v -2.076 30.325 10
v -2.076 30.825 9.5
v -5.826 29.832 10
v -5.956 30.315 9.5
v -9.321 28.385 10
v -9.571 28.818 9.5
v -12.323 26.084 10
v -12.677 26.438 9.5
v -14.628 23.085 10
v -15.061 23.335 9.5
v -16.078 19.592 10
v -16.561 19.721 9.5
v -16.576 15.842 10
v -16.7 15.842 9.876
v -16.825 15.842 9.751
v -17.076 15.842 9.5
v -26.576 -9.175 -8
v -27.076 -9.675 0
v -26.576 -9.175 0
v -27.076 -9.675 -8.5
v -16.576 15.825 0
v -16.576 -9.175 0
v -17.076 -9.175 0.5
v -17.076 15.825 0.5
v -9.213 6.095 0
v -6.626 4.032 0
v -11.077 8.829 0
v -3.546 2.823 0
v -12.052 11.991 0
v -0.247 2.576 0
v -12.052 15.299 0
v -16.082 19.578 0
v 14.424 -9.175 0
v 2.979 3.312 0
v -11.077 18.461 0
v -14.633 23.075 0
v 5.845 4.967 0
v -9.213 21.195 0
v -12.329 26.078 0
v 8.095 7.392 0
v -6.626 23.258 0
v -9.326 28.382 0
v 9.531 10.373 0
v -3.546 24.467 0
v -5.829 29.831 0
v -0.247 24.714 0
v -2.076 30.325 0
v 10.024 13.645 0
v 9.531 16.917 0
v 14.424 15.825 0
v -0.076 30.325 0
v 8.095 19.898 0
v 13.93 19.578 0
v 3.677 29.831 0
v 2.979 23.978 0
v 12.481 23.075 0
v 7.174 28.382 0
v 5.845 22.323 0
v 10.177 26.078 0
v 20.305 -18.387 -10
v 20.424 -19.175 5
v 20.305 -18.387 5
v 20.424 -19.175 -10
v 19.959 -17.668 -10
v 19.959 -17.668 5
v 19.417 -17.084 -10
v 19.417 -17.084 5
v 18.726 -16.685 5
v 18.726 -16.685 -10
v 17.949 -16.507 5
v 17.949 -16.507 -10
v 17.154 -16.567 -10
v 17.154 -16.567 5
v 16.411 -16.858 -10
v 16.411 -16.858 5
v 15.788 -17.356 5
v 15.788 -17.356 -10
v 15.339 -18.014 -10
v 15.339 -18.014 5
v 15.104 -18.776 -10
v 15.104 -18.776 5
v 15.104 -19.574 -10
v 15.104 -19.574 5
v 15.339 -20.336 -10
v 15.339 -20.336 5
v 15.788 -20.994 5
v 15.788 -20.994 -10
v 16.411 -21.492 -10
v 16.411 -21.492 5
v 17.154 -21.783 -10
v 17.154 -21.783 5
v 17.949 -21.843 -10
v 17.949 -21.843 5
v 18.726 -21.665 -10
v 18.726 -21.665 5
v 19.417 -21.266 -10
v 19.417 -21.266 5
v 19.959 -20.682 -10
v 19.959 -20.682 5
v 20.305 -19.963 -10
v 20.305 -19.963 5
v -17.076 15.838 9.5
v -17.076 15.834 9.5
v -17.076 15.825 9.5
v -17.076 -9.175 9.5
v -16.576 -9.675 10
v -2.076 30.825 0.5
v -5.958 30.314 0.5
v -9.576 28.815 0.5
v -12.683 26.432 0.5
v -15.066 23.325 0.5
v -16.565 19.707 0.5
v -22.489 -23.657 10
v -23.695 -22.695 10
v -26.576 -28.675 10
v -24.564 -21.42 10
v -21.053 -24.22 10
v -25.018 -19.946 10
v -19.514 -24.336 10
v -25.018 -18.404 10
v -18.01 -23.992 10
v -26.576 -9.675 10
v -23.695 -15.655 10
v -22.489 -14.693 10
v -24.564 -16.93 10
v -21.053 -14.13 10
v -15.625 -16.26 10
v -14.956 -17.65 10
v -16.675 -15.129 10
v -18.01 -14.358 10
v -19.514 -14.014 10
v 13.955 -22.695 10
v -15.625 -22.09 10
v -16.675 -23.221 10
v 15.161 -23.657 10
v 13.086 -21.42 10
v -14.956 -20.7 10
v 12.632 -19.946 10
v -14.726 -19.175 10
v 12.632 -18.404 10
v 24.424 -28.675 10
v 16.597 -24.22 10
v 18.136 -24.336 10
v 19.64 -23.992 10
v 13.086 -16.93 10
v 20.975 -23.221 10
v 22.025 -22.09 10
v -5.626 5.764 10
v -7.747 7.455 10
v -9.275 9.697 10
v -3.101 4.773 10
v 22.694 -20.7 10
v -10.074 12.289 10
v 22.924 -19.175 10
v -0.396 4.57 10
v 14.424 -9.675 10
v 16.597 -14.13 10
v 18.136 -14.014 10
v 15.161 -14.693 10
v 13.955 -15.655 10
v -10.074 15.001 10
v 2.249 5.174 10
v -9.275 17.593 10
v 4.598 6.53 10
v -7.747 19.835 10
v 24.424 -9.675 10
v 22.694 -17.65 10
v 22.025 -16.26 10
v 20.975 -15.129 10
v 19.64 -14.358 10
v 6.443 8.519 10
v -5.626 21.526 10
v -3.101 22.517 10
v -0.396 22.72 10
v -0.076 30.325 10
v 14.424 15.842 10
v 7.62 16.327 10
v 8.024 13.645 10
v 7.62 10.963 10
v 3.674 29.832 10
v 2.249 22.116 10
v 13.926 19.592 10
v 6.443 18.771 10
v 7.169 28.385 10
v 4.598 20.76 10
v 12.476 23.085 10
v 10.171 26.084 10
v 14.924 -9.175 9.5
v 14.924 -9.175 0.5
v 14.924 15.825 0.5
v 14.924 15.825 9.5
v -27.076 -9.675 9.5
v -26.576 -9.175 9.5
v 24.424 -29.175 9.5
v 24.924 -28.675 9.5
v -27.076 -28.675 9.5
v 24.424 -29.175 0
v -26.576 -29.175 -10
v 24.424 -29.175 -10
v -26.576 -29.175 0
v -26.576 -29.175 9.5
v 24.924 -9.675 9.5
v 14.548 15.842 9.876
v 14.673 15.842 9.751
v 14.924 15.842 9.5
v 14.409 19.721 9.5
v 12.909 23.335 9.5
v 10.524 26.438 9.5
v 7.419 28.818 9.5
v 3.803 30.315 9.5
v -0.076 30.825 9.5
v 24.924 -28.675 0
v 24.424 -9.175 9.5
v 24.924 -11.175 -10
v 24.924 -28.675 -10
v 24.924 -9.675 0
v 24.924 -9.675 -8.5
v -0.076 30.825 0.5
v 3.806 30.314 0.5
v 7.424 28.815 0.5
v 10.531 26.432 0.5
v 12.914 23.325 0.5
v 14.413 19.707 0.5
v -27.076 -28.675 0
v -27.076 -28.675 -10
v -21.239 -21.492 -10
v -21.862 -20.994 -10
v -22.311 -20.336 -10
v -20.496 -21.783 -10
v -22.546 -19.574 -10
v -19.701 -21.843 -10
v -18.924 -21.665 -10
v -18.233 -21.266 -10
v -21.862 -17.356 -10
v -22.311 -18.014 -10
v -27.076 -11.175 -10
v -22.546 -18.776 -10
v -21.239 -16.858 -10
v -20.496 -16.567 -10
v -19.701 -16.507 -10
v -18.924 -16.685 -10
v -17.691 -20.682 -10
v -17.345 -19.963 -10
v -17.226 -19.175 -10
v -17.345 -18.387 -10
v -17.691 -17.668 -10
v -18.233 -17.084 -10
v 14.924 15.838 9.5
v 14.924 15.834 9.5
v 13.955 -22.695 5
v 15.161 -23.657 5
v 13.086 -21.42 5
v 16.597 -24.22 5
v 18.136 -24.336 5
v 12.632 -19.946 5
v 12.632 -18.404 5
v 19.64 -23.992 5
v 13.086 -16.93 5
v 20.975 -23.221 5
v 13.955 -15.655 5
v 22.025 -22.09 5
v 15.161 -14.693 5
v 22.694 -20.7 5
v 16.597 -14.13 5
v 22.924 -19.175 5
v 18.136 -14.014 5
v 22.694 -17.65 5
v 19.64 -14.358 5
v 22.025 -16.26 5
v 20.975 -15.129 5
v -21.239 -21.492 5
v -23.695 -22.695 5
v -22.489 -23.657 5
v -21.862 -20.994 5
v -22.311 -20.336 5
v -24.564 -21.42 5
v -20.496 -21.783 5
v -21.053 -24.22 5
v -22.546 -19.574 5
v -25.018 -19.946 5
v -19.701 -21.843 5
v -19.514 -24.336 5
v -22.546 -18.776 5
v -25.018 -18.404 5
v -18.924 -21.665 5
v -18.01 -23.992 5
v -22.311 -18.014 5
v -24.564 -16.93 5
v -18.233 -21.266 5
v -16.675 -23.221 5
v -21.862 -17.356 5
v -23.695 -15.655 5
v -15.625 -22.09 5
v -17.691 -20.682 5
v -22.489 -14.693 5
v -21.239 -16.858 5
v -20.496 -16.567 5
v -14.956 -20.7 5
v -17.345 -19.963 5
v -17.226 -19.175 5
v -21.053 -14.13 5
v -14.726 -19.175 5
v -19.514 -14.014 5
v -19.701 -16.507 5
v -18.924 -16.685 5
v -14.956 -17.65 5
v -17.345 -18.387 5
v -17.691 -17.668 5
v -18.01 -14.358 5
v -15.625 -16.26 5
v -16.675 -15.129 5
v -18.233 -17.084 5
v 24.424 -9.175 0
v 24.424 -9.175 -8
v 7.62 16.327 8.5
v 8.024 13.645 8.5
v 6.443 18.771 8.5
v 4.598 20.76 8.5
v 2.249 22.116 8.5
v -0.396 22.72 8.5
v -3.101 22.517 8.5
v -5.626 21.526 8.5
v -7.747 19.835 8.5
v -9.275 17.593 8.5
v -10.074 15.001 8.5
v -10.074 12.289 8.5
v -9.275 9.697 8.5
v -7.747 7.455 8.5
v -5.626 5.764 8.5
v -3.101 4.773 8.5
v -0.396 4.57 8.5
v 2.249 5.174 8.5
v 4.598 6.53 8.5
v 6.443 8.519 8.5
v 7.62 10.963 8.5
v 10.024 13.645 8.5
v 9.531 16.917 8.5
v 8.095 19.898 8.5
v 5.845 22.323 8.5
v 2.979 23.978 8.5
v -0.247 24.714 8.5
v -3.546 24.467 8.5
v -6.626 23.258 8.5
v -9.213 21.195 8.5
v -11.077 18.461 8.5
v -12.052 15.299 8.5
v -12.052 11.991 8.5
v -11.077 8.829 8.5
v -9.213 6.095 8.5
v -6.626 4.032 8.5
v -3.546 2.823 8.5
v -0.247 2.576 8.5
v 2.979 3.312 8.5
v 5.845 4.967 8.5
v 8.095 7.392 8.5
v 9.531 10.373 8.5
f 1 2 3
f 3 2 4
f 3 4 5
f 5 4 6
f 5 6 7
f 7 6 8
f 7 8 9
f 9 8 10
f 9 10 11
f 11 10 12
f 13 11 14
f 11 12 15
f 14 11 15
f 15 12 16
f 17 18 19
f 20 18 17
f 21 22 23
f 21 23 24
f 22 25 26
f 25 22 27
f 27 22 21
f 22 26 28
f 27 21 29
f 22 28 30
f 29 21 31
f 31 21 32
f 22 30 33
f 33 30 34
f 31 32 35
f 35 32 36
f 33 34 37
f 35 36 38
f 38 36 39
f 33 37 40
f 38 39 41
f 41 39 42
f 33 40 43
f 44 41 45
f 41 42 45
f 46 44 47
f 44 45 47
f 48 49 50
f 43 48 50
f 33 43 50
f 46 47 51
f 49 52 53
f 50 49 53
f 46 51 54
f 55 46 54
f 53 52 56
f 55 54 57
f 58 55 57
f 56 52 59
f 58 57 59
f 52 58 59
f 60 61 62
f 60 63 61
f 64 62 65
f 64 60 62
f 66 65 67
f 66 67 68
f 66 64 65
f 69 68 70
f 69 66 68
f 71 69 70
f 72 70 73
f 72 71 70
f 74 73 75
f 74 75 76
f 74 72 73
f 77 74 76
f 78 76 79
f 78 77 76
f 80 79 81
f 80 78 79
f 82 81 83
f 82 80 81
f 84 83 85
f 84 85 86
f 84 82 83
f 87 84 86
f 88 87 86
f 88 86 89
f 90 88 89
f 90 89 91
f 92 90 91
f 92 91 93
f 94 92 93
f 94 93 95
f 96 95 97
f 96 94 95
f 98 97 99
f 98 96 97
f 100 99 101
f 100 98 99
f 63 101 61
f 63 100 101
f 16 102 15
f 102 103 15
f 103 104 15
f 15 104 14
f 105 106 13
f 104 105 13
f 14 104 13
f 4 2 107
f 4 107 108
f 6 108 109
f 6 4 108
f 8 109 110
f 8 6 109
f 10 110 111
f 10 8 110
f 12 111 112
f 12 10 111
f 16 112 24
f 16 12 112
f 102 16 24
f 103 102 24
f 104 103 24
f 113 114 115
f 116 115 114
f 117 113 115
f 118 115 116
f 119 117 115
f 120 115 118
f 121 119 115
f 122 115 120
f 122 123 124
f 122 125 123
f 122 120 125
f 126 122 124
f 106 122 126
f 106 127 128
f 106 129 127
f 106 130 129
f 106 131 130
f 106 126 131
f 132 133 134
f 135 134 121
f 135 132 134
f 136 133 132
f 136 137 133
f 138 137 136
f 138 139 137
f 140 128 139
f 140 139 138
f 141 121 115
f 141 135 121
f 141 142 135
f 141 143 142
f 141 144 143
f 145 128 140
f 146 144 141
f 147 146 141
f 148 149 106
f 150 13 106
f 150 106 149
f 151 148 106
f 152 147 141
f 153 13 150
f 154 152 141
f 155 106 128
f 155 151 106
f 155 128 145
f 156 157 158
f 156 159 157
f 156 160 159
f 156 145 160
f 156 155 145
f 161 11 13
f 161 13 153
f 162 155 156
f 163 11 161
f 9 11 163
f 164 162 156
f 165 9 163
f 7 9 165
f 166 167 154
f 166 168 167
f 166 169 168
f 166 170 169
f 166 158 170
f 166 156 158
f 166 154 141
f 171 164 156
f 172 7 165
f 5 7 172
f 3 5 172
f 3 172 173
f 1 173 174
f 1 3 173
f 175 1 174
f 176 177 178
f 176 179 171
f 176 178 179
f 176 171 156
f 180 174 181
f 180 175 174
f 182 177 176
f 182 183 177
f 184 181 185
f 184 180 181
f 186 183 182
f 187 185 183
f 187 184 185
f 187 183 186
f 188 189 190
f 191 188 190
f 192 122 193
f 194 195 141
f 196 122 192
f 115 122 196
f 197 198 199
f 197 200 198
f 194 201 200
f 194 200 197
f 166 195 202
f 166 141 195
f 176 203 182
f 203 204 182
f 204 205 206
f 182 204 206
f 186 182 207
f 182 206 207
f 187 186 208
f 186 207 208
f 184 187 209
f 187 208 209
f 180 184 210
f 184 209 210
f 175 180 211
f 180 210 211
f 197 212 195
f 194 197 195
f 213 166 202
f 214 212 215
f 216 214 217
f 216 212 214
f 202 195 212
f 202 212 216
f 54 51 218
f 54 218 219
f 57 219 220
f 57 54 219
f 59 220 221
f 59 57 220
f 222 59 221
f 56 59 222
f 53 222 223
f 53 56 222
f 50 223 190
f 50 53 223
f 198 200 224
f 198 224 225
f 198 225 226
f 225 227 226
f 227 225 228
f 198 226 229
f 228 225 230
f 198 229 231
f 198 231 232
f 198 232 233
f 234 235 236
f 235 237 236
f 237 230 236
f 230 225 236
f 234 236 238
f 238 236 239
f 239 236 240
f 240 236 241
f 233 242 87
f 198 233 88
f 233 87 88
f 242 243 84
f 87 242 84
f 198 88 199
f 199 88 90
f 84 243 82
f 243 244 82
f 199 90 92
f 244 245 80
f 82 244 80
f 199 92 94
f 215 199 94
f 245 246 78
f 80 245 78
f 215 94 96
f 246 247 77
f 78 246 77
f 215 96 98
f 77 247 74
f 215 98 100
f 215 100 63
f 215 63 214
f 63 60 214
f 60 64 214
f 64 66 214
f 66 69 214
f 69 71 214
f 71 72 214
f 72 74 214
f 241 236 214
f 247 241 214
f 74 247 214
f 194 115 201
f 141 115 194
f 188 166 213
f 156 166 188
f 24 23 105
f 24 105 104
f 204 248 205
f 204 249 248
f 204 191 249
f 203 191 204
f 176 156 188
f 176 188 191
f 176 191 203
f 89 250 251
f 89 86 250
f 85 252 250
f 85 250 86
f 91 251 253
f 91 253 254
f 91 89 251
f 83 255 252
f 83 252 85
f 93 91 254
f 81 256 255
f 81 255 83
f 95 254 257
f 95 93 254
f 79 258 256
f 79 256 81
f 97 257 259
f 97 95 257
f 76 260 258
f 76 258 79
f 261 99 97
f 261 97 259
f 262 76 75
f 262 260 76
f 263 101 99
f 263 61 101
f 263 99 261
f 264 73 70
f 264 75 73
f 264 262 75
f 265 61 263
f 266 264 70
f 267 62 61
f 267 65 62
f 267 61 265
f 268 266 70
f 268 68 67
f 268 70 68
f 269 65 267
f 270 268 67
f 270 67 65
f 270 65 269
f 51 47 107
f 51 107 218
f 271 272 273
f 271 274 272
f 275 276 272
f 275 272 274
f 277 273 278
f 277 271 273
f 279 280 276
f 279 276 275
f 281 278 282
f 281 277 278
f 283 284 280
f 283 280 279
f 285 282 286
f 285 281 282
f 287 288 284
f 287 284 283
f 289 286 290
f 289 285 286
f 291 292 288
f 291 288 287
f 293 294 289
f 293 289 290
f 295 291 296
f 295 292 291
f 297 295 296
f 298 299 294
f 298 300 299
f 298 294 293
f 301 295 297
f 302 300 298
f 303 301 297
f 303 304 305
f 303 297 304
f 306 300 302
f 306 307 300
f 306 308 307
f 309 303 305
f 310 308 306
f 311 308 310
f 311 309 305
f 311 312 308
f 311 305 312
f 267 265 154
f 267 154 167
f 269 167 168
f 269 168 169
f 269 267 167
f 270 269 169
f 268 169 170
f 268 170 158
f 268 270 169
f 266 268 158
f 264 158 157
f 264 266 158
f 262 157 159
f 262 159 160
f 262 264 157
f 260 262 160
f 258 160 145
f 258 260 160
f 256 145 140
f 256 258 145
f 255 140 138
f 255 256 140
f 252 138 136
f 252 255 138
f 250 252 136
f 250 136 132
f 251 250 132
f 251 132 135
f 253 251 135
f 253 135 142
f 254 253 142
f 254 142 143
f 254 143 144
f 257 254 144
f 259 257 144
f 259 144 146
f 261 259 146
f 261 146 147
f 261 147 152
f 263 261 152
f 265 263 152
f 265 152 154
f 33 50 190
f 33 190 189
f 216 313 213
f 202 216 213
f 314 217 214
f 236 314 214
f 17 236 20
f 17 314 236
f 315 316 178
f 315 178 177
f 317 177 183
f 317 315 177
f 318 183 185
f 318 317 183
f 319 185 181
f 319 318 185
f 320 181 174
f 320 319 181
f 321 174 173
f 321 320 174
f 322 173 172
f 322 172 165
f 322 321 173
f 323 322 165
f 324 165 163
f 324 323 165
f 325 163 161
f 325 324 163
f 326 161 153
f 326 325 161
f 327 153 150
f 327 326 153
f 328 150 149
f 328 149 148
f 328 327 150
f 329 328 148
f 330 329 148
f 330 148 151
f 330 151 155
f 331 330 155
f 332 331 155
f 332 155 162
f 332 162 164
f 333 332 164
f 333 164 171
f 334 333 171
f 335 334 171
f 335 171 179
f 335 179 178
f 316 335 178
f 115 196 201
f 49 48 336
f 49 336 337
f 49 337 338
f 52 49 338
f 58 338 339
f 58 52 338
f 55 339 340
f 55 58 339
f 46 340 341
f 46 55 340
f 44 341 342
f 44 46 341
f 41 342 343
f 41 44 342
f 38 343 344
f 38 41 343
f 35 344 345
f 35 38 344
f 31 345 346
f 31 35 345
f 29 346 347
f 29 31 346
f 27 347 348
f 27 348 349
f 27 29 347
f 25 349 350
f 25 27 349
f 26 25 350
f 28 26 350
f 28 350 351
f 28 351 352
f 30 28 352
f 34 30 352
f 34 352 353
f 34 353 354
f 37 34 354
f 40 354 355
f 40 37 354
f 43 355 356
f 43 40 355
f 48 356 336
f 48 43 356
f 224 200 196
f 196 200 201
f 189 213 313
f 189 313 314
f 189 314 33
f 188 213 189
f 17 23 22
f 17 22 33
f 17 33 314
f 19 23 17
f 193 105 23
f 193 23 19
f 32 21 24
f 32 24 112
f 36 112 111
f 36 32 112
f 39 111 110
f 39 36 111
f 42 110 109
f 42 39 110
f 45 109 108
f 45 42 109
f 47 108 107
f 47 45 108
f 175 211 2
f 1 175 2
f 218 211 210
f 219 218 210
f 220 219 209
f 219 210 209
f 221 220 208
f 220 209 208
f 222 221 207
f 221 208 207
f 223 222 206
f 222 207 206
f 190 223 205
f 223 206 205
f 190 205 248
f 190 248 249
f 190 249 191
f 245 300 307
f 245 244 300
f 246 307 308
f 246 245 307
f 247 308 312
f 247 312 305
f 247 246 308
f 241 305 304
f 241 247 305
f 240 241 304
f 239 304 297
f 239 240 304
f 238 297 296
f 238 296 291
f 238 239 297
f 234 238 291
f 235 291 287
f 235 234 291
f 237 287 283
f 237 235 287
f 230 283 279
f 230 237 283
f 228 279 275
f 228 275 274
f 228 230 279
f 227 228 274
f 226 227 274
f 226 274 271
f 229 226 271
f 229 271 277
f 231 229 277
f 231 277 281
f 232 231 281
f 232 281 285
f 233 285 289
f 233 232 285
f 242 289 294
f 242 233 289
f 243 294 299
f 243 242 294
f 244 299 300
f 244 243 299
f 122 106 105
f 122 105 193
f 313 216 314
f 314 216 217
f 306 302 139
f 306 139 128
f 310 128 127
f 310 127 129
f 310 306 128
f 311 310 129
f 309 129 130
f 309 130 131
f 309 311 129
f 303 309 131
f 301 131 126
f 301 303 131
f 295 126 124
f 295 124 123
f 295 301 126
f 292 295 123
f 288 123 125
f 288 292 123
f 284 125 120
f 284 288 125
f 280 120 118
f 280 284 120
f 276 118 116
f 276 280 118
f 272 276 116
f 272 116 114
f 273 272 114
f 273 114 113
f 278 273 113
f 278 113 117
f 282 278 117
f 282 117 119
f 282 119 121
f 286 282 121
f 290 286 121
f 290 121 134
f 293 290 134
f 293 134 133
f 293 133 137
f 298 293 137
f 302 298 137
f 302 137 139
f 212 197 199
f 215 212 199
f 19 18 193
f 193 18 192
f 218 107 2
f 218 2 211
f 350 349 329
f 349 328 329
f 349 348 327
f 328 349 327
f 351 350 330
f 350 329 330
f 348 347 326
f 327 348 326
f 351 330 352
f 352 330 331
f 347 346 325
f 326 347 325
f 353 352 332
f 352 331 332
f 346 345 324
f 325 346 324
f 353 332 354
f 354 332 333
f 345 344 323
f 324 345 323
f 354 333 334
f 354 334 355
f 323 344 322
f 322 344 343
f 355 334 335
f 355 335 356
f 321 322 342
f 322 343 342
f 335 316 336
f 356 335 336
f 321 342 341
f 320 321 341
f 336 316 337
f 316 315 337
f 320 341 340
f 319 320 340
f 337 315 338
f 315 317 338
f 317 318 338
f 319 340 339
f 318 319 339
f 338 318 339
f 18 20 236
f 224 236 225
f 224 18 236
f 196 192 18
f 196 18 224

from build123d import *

# Parameters (mm, degrees)
F0_W      = 32
F0_H      = 40
F0_R      = 11.1
F0_R_2    = 5.175
F1_DEPTH  = 10
F0_R_3    = 2.675
F2_DEPTH  = 5
F3_DEPTH  = 5
F4_SIZE   = 0.5
F5_DEPTH  = 10
F6_DEPTH  = 10
F8_SIZE   = 2
F0_R_4    = 9.1
F9_DEPTH  = 10
F10_DEPTH = 8.5
F11_R     = 15
F12_SIZE  = 0.49999


# Not quite as in the source:
# - a fillet or chamfer is up to 0.001 mm smaller than in the source, because OpenCascade refuses the exact size
# - a feature of the source that left no trace in its solid (it failed there, or was rolled back) is left out


with BuildPart() as f1:
    # F0 (on Top) → F1 (new body)
    with BuildSketch(Plane.XY):
        with Locations((-1.076085493, 10.825)):
            Rectangle(F0_W, F0_H)
        with Locations((-1.076085493, 13.645)):
            Circle(F0_R, mode=Mode.SUBTRACT)
        Polygon((14.923914507, -9.175), (-17.076085493, -9.175), (-27.076085493, -9.175), (-27.076085493, -29.175), (-17.076085493, -29.175), (14.923914507, -29.175), (24.923914507, -29.175), (24.923914507, -9.175), align=None)
        with Locations((-19.901085493, -19.175)):
            Circle(F0_R_2, mode=Mode.SUBTRACT)
        with Locations((17.748914507, -19.175)):
            Circle(F0_R_2, mode=Mode.SUBTRACT)
    extrude(amount=F1_DEPTH)

    # F0 (on Top) → F2 (join)
    with BuildSketch(Plane.XY):
        with Locations((-19.901085493, -19.175)):
            Circle(F0_R_2)
        with Locations((-19.901085493, -19.175)):
            Circle(F0_R_3, mode=Mode.SUBTRACT)
    extrude(amount=F2_DEPTH)

    # F0 (on Top) → F3 (join)
    with BuildSketch(Plane.XY):
        with Locations((17.748914507, -19.175)):
            Circle(F0_R_2)
        with Locations((17.748914507, -19.175)):
            Circle(F0_R_3, mode=Mode.SUBTRACT)
    extrude(amount=F3_DEPTH)

    # F4
    f4_edges = [f1.edges().sort_by_distance(p)[0] for p in [
        (-27.076085, -19.175, 10),
        (-22.076085, -9.175, 10),
        (19.923915, -9.175, 10),
        (24.923915, -19.175, 10),
        (24.923915, -9.175, 5),
        (-27.076085, -9.175, 5),
        (-27.076085, -29.175, 5),
        (24.923915, -29.175, 5),
        (-1.076085, -29.175, 10),
        (-17.076085, 10.825, 10),
        (14.923915, 10.825, 10),
    ]]
    chamfer(f4_edges, length=F4_SIZE)

    # F0 (on Top) → F5 (join)
    with BuildSketch(Plane.XY):
        Polygon((14.923914507, -9.175), (-17.076085493, -9.175), (-27.076085493, -9.175), (-27.076085493, -29.175), (-17.076085493, -29.175), (14.923914507, -29.175), (24.923914507, -29.175), (24.923914507, -9.175), align=None)
        with Locations((-19.901085493, -19.175)):
            Circle(F0_R_2, mode=Mode.SUBTRACT)
        with Locations((17.748914507, -19.175)):
            Circle(F0_R_2, mode=Mode.SUBTRACT)
    extrude(amount=-F5_DEPTH)

    # F0 (on Top) → F6 (join)
    with BuildSketch(Plane.XY):
        with Locations((17.748914507, -19.175)):
            Circle(F0_R_2)
        with Locations((17.748914507, -19.175)):
            Circle(F0_R_3, mode=Mode.SUBTRACT)
        with Locations((-19.901085493, -19.175)):
            Circle(F0_R_2)
        with Locations((-19.901085493, -19.175)):
            Circle(F0_R_3, mode=Mode.SUBTRACT)
    extrude(amount=-F6_DEPTH)

    # F8
    f8_edges = [f1.edges().sort_by_distance(p)[0] for p in [
        (-1.076085, -9.175, -10),
    ]]
    chamfer(f8_edges, length=F8_SIZE)

    # F0 (on Top) → F9 (join)
    with BuildSketch(Plane.XY):
        with Locations((-1.076085493, 13.645)):
            Circle(F0_R)
        with Locations((-1.076085493, 13.645)):
            Circle(F0_R_4, mode=Mode.SUBTRACT)
    extrude(amount=F9_DEPTH)

    # F0 (on Top) → F10 (cut)
    with BuildSketch(Plane.XY):
        with Locations((-1.076085493, 13.645)):
            Circle(F0_R)
        with Locations((-1.076085493, 13.645)):
            Circle(F0_R_4, mode=Mode.SUBTRACT)
    extrude(amount=F10_DEPTH, mode=Mode.SUBTRACT)

    # F11
    f11_edges = [f1.edges().sort_by_distance(p)[0] for p in [
        (14.923915, 30.825, 4.75),
        (-17.076085, 30.825, 4.75),
    ]]
    fillet(f11_edges, radius=F11_R)

    # F12 (size 0.5 in the source; OpenCascade refuses exactly that, so slightly less here)
    f12_edges = [f1.edges().sort_by_distance(p)[0] for p in [
        (10.530516, 26.431602, 0),
        (-11.224621, 27.712148, 10),
        (9.07245, 27.712148, 10),
        (-1.076085, 30.825, 10),
        (-1.076085, 30.825, 0),
        (-12.682687, 26.431602, 0),
        (-17.076085, 3.325, 0),
        (-27.076085, -9.175, -4),
        (24.923915, -9.175, -4),
        (14.923915, 3.325, 0),
        (-27.076085, -29.175, -5),
        (24.923915, -29.175, -5),
    ]]
    chamfer(f12_edges, length=F12_SIZE)


solid = f1.part
